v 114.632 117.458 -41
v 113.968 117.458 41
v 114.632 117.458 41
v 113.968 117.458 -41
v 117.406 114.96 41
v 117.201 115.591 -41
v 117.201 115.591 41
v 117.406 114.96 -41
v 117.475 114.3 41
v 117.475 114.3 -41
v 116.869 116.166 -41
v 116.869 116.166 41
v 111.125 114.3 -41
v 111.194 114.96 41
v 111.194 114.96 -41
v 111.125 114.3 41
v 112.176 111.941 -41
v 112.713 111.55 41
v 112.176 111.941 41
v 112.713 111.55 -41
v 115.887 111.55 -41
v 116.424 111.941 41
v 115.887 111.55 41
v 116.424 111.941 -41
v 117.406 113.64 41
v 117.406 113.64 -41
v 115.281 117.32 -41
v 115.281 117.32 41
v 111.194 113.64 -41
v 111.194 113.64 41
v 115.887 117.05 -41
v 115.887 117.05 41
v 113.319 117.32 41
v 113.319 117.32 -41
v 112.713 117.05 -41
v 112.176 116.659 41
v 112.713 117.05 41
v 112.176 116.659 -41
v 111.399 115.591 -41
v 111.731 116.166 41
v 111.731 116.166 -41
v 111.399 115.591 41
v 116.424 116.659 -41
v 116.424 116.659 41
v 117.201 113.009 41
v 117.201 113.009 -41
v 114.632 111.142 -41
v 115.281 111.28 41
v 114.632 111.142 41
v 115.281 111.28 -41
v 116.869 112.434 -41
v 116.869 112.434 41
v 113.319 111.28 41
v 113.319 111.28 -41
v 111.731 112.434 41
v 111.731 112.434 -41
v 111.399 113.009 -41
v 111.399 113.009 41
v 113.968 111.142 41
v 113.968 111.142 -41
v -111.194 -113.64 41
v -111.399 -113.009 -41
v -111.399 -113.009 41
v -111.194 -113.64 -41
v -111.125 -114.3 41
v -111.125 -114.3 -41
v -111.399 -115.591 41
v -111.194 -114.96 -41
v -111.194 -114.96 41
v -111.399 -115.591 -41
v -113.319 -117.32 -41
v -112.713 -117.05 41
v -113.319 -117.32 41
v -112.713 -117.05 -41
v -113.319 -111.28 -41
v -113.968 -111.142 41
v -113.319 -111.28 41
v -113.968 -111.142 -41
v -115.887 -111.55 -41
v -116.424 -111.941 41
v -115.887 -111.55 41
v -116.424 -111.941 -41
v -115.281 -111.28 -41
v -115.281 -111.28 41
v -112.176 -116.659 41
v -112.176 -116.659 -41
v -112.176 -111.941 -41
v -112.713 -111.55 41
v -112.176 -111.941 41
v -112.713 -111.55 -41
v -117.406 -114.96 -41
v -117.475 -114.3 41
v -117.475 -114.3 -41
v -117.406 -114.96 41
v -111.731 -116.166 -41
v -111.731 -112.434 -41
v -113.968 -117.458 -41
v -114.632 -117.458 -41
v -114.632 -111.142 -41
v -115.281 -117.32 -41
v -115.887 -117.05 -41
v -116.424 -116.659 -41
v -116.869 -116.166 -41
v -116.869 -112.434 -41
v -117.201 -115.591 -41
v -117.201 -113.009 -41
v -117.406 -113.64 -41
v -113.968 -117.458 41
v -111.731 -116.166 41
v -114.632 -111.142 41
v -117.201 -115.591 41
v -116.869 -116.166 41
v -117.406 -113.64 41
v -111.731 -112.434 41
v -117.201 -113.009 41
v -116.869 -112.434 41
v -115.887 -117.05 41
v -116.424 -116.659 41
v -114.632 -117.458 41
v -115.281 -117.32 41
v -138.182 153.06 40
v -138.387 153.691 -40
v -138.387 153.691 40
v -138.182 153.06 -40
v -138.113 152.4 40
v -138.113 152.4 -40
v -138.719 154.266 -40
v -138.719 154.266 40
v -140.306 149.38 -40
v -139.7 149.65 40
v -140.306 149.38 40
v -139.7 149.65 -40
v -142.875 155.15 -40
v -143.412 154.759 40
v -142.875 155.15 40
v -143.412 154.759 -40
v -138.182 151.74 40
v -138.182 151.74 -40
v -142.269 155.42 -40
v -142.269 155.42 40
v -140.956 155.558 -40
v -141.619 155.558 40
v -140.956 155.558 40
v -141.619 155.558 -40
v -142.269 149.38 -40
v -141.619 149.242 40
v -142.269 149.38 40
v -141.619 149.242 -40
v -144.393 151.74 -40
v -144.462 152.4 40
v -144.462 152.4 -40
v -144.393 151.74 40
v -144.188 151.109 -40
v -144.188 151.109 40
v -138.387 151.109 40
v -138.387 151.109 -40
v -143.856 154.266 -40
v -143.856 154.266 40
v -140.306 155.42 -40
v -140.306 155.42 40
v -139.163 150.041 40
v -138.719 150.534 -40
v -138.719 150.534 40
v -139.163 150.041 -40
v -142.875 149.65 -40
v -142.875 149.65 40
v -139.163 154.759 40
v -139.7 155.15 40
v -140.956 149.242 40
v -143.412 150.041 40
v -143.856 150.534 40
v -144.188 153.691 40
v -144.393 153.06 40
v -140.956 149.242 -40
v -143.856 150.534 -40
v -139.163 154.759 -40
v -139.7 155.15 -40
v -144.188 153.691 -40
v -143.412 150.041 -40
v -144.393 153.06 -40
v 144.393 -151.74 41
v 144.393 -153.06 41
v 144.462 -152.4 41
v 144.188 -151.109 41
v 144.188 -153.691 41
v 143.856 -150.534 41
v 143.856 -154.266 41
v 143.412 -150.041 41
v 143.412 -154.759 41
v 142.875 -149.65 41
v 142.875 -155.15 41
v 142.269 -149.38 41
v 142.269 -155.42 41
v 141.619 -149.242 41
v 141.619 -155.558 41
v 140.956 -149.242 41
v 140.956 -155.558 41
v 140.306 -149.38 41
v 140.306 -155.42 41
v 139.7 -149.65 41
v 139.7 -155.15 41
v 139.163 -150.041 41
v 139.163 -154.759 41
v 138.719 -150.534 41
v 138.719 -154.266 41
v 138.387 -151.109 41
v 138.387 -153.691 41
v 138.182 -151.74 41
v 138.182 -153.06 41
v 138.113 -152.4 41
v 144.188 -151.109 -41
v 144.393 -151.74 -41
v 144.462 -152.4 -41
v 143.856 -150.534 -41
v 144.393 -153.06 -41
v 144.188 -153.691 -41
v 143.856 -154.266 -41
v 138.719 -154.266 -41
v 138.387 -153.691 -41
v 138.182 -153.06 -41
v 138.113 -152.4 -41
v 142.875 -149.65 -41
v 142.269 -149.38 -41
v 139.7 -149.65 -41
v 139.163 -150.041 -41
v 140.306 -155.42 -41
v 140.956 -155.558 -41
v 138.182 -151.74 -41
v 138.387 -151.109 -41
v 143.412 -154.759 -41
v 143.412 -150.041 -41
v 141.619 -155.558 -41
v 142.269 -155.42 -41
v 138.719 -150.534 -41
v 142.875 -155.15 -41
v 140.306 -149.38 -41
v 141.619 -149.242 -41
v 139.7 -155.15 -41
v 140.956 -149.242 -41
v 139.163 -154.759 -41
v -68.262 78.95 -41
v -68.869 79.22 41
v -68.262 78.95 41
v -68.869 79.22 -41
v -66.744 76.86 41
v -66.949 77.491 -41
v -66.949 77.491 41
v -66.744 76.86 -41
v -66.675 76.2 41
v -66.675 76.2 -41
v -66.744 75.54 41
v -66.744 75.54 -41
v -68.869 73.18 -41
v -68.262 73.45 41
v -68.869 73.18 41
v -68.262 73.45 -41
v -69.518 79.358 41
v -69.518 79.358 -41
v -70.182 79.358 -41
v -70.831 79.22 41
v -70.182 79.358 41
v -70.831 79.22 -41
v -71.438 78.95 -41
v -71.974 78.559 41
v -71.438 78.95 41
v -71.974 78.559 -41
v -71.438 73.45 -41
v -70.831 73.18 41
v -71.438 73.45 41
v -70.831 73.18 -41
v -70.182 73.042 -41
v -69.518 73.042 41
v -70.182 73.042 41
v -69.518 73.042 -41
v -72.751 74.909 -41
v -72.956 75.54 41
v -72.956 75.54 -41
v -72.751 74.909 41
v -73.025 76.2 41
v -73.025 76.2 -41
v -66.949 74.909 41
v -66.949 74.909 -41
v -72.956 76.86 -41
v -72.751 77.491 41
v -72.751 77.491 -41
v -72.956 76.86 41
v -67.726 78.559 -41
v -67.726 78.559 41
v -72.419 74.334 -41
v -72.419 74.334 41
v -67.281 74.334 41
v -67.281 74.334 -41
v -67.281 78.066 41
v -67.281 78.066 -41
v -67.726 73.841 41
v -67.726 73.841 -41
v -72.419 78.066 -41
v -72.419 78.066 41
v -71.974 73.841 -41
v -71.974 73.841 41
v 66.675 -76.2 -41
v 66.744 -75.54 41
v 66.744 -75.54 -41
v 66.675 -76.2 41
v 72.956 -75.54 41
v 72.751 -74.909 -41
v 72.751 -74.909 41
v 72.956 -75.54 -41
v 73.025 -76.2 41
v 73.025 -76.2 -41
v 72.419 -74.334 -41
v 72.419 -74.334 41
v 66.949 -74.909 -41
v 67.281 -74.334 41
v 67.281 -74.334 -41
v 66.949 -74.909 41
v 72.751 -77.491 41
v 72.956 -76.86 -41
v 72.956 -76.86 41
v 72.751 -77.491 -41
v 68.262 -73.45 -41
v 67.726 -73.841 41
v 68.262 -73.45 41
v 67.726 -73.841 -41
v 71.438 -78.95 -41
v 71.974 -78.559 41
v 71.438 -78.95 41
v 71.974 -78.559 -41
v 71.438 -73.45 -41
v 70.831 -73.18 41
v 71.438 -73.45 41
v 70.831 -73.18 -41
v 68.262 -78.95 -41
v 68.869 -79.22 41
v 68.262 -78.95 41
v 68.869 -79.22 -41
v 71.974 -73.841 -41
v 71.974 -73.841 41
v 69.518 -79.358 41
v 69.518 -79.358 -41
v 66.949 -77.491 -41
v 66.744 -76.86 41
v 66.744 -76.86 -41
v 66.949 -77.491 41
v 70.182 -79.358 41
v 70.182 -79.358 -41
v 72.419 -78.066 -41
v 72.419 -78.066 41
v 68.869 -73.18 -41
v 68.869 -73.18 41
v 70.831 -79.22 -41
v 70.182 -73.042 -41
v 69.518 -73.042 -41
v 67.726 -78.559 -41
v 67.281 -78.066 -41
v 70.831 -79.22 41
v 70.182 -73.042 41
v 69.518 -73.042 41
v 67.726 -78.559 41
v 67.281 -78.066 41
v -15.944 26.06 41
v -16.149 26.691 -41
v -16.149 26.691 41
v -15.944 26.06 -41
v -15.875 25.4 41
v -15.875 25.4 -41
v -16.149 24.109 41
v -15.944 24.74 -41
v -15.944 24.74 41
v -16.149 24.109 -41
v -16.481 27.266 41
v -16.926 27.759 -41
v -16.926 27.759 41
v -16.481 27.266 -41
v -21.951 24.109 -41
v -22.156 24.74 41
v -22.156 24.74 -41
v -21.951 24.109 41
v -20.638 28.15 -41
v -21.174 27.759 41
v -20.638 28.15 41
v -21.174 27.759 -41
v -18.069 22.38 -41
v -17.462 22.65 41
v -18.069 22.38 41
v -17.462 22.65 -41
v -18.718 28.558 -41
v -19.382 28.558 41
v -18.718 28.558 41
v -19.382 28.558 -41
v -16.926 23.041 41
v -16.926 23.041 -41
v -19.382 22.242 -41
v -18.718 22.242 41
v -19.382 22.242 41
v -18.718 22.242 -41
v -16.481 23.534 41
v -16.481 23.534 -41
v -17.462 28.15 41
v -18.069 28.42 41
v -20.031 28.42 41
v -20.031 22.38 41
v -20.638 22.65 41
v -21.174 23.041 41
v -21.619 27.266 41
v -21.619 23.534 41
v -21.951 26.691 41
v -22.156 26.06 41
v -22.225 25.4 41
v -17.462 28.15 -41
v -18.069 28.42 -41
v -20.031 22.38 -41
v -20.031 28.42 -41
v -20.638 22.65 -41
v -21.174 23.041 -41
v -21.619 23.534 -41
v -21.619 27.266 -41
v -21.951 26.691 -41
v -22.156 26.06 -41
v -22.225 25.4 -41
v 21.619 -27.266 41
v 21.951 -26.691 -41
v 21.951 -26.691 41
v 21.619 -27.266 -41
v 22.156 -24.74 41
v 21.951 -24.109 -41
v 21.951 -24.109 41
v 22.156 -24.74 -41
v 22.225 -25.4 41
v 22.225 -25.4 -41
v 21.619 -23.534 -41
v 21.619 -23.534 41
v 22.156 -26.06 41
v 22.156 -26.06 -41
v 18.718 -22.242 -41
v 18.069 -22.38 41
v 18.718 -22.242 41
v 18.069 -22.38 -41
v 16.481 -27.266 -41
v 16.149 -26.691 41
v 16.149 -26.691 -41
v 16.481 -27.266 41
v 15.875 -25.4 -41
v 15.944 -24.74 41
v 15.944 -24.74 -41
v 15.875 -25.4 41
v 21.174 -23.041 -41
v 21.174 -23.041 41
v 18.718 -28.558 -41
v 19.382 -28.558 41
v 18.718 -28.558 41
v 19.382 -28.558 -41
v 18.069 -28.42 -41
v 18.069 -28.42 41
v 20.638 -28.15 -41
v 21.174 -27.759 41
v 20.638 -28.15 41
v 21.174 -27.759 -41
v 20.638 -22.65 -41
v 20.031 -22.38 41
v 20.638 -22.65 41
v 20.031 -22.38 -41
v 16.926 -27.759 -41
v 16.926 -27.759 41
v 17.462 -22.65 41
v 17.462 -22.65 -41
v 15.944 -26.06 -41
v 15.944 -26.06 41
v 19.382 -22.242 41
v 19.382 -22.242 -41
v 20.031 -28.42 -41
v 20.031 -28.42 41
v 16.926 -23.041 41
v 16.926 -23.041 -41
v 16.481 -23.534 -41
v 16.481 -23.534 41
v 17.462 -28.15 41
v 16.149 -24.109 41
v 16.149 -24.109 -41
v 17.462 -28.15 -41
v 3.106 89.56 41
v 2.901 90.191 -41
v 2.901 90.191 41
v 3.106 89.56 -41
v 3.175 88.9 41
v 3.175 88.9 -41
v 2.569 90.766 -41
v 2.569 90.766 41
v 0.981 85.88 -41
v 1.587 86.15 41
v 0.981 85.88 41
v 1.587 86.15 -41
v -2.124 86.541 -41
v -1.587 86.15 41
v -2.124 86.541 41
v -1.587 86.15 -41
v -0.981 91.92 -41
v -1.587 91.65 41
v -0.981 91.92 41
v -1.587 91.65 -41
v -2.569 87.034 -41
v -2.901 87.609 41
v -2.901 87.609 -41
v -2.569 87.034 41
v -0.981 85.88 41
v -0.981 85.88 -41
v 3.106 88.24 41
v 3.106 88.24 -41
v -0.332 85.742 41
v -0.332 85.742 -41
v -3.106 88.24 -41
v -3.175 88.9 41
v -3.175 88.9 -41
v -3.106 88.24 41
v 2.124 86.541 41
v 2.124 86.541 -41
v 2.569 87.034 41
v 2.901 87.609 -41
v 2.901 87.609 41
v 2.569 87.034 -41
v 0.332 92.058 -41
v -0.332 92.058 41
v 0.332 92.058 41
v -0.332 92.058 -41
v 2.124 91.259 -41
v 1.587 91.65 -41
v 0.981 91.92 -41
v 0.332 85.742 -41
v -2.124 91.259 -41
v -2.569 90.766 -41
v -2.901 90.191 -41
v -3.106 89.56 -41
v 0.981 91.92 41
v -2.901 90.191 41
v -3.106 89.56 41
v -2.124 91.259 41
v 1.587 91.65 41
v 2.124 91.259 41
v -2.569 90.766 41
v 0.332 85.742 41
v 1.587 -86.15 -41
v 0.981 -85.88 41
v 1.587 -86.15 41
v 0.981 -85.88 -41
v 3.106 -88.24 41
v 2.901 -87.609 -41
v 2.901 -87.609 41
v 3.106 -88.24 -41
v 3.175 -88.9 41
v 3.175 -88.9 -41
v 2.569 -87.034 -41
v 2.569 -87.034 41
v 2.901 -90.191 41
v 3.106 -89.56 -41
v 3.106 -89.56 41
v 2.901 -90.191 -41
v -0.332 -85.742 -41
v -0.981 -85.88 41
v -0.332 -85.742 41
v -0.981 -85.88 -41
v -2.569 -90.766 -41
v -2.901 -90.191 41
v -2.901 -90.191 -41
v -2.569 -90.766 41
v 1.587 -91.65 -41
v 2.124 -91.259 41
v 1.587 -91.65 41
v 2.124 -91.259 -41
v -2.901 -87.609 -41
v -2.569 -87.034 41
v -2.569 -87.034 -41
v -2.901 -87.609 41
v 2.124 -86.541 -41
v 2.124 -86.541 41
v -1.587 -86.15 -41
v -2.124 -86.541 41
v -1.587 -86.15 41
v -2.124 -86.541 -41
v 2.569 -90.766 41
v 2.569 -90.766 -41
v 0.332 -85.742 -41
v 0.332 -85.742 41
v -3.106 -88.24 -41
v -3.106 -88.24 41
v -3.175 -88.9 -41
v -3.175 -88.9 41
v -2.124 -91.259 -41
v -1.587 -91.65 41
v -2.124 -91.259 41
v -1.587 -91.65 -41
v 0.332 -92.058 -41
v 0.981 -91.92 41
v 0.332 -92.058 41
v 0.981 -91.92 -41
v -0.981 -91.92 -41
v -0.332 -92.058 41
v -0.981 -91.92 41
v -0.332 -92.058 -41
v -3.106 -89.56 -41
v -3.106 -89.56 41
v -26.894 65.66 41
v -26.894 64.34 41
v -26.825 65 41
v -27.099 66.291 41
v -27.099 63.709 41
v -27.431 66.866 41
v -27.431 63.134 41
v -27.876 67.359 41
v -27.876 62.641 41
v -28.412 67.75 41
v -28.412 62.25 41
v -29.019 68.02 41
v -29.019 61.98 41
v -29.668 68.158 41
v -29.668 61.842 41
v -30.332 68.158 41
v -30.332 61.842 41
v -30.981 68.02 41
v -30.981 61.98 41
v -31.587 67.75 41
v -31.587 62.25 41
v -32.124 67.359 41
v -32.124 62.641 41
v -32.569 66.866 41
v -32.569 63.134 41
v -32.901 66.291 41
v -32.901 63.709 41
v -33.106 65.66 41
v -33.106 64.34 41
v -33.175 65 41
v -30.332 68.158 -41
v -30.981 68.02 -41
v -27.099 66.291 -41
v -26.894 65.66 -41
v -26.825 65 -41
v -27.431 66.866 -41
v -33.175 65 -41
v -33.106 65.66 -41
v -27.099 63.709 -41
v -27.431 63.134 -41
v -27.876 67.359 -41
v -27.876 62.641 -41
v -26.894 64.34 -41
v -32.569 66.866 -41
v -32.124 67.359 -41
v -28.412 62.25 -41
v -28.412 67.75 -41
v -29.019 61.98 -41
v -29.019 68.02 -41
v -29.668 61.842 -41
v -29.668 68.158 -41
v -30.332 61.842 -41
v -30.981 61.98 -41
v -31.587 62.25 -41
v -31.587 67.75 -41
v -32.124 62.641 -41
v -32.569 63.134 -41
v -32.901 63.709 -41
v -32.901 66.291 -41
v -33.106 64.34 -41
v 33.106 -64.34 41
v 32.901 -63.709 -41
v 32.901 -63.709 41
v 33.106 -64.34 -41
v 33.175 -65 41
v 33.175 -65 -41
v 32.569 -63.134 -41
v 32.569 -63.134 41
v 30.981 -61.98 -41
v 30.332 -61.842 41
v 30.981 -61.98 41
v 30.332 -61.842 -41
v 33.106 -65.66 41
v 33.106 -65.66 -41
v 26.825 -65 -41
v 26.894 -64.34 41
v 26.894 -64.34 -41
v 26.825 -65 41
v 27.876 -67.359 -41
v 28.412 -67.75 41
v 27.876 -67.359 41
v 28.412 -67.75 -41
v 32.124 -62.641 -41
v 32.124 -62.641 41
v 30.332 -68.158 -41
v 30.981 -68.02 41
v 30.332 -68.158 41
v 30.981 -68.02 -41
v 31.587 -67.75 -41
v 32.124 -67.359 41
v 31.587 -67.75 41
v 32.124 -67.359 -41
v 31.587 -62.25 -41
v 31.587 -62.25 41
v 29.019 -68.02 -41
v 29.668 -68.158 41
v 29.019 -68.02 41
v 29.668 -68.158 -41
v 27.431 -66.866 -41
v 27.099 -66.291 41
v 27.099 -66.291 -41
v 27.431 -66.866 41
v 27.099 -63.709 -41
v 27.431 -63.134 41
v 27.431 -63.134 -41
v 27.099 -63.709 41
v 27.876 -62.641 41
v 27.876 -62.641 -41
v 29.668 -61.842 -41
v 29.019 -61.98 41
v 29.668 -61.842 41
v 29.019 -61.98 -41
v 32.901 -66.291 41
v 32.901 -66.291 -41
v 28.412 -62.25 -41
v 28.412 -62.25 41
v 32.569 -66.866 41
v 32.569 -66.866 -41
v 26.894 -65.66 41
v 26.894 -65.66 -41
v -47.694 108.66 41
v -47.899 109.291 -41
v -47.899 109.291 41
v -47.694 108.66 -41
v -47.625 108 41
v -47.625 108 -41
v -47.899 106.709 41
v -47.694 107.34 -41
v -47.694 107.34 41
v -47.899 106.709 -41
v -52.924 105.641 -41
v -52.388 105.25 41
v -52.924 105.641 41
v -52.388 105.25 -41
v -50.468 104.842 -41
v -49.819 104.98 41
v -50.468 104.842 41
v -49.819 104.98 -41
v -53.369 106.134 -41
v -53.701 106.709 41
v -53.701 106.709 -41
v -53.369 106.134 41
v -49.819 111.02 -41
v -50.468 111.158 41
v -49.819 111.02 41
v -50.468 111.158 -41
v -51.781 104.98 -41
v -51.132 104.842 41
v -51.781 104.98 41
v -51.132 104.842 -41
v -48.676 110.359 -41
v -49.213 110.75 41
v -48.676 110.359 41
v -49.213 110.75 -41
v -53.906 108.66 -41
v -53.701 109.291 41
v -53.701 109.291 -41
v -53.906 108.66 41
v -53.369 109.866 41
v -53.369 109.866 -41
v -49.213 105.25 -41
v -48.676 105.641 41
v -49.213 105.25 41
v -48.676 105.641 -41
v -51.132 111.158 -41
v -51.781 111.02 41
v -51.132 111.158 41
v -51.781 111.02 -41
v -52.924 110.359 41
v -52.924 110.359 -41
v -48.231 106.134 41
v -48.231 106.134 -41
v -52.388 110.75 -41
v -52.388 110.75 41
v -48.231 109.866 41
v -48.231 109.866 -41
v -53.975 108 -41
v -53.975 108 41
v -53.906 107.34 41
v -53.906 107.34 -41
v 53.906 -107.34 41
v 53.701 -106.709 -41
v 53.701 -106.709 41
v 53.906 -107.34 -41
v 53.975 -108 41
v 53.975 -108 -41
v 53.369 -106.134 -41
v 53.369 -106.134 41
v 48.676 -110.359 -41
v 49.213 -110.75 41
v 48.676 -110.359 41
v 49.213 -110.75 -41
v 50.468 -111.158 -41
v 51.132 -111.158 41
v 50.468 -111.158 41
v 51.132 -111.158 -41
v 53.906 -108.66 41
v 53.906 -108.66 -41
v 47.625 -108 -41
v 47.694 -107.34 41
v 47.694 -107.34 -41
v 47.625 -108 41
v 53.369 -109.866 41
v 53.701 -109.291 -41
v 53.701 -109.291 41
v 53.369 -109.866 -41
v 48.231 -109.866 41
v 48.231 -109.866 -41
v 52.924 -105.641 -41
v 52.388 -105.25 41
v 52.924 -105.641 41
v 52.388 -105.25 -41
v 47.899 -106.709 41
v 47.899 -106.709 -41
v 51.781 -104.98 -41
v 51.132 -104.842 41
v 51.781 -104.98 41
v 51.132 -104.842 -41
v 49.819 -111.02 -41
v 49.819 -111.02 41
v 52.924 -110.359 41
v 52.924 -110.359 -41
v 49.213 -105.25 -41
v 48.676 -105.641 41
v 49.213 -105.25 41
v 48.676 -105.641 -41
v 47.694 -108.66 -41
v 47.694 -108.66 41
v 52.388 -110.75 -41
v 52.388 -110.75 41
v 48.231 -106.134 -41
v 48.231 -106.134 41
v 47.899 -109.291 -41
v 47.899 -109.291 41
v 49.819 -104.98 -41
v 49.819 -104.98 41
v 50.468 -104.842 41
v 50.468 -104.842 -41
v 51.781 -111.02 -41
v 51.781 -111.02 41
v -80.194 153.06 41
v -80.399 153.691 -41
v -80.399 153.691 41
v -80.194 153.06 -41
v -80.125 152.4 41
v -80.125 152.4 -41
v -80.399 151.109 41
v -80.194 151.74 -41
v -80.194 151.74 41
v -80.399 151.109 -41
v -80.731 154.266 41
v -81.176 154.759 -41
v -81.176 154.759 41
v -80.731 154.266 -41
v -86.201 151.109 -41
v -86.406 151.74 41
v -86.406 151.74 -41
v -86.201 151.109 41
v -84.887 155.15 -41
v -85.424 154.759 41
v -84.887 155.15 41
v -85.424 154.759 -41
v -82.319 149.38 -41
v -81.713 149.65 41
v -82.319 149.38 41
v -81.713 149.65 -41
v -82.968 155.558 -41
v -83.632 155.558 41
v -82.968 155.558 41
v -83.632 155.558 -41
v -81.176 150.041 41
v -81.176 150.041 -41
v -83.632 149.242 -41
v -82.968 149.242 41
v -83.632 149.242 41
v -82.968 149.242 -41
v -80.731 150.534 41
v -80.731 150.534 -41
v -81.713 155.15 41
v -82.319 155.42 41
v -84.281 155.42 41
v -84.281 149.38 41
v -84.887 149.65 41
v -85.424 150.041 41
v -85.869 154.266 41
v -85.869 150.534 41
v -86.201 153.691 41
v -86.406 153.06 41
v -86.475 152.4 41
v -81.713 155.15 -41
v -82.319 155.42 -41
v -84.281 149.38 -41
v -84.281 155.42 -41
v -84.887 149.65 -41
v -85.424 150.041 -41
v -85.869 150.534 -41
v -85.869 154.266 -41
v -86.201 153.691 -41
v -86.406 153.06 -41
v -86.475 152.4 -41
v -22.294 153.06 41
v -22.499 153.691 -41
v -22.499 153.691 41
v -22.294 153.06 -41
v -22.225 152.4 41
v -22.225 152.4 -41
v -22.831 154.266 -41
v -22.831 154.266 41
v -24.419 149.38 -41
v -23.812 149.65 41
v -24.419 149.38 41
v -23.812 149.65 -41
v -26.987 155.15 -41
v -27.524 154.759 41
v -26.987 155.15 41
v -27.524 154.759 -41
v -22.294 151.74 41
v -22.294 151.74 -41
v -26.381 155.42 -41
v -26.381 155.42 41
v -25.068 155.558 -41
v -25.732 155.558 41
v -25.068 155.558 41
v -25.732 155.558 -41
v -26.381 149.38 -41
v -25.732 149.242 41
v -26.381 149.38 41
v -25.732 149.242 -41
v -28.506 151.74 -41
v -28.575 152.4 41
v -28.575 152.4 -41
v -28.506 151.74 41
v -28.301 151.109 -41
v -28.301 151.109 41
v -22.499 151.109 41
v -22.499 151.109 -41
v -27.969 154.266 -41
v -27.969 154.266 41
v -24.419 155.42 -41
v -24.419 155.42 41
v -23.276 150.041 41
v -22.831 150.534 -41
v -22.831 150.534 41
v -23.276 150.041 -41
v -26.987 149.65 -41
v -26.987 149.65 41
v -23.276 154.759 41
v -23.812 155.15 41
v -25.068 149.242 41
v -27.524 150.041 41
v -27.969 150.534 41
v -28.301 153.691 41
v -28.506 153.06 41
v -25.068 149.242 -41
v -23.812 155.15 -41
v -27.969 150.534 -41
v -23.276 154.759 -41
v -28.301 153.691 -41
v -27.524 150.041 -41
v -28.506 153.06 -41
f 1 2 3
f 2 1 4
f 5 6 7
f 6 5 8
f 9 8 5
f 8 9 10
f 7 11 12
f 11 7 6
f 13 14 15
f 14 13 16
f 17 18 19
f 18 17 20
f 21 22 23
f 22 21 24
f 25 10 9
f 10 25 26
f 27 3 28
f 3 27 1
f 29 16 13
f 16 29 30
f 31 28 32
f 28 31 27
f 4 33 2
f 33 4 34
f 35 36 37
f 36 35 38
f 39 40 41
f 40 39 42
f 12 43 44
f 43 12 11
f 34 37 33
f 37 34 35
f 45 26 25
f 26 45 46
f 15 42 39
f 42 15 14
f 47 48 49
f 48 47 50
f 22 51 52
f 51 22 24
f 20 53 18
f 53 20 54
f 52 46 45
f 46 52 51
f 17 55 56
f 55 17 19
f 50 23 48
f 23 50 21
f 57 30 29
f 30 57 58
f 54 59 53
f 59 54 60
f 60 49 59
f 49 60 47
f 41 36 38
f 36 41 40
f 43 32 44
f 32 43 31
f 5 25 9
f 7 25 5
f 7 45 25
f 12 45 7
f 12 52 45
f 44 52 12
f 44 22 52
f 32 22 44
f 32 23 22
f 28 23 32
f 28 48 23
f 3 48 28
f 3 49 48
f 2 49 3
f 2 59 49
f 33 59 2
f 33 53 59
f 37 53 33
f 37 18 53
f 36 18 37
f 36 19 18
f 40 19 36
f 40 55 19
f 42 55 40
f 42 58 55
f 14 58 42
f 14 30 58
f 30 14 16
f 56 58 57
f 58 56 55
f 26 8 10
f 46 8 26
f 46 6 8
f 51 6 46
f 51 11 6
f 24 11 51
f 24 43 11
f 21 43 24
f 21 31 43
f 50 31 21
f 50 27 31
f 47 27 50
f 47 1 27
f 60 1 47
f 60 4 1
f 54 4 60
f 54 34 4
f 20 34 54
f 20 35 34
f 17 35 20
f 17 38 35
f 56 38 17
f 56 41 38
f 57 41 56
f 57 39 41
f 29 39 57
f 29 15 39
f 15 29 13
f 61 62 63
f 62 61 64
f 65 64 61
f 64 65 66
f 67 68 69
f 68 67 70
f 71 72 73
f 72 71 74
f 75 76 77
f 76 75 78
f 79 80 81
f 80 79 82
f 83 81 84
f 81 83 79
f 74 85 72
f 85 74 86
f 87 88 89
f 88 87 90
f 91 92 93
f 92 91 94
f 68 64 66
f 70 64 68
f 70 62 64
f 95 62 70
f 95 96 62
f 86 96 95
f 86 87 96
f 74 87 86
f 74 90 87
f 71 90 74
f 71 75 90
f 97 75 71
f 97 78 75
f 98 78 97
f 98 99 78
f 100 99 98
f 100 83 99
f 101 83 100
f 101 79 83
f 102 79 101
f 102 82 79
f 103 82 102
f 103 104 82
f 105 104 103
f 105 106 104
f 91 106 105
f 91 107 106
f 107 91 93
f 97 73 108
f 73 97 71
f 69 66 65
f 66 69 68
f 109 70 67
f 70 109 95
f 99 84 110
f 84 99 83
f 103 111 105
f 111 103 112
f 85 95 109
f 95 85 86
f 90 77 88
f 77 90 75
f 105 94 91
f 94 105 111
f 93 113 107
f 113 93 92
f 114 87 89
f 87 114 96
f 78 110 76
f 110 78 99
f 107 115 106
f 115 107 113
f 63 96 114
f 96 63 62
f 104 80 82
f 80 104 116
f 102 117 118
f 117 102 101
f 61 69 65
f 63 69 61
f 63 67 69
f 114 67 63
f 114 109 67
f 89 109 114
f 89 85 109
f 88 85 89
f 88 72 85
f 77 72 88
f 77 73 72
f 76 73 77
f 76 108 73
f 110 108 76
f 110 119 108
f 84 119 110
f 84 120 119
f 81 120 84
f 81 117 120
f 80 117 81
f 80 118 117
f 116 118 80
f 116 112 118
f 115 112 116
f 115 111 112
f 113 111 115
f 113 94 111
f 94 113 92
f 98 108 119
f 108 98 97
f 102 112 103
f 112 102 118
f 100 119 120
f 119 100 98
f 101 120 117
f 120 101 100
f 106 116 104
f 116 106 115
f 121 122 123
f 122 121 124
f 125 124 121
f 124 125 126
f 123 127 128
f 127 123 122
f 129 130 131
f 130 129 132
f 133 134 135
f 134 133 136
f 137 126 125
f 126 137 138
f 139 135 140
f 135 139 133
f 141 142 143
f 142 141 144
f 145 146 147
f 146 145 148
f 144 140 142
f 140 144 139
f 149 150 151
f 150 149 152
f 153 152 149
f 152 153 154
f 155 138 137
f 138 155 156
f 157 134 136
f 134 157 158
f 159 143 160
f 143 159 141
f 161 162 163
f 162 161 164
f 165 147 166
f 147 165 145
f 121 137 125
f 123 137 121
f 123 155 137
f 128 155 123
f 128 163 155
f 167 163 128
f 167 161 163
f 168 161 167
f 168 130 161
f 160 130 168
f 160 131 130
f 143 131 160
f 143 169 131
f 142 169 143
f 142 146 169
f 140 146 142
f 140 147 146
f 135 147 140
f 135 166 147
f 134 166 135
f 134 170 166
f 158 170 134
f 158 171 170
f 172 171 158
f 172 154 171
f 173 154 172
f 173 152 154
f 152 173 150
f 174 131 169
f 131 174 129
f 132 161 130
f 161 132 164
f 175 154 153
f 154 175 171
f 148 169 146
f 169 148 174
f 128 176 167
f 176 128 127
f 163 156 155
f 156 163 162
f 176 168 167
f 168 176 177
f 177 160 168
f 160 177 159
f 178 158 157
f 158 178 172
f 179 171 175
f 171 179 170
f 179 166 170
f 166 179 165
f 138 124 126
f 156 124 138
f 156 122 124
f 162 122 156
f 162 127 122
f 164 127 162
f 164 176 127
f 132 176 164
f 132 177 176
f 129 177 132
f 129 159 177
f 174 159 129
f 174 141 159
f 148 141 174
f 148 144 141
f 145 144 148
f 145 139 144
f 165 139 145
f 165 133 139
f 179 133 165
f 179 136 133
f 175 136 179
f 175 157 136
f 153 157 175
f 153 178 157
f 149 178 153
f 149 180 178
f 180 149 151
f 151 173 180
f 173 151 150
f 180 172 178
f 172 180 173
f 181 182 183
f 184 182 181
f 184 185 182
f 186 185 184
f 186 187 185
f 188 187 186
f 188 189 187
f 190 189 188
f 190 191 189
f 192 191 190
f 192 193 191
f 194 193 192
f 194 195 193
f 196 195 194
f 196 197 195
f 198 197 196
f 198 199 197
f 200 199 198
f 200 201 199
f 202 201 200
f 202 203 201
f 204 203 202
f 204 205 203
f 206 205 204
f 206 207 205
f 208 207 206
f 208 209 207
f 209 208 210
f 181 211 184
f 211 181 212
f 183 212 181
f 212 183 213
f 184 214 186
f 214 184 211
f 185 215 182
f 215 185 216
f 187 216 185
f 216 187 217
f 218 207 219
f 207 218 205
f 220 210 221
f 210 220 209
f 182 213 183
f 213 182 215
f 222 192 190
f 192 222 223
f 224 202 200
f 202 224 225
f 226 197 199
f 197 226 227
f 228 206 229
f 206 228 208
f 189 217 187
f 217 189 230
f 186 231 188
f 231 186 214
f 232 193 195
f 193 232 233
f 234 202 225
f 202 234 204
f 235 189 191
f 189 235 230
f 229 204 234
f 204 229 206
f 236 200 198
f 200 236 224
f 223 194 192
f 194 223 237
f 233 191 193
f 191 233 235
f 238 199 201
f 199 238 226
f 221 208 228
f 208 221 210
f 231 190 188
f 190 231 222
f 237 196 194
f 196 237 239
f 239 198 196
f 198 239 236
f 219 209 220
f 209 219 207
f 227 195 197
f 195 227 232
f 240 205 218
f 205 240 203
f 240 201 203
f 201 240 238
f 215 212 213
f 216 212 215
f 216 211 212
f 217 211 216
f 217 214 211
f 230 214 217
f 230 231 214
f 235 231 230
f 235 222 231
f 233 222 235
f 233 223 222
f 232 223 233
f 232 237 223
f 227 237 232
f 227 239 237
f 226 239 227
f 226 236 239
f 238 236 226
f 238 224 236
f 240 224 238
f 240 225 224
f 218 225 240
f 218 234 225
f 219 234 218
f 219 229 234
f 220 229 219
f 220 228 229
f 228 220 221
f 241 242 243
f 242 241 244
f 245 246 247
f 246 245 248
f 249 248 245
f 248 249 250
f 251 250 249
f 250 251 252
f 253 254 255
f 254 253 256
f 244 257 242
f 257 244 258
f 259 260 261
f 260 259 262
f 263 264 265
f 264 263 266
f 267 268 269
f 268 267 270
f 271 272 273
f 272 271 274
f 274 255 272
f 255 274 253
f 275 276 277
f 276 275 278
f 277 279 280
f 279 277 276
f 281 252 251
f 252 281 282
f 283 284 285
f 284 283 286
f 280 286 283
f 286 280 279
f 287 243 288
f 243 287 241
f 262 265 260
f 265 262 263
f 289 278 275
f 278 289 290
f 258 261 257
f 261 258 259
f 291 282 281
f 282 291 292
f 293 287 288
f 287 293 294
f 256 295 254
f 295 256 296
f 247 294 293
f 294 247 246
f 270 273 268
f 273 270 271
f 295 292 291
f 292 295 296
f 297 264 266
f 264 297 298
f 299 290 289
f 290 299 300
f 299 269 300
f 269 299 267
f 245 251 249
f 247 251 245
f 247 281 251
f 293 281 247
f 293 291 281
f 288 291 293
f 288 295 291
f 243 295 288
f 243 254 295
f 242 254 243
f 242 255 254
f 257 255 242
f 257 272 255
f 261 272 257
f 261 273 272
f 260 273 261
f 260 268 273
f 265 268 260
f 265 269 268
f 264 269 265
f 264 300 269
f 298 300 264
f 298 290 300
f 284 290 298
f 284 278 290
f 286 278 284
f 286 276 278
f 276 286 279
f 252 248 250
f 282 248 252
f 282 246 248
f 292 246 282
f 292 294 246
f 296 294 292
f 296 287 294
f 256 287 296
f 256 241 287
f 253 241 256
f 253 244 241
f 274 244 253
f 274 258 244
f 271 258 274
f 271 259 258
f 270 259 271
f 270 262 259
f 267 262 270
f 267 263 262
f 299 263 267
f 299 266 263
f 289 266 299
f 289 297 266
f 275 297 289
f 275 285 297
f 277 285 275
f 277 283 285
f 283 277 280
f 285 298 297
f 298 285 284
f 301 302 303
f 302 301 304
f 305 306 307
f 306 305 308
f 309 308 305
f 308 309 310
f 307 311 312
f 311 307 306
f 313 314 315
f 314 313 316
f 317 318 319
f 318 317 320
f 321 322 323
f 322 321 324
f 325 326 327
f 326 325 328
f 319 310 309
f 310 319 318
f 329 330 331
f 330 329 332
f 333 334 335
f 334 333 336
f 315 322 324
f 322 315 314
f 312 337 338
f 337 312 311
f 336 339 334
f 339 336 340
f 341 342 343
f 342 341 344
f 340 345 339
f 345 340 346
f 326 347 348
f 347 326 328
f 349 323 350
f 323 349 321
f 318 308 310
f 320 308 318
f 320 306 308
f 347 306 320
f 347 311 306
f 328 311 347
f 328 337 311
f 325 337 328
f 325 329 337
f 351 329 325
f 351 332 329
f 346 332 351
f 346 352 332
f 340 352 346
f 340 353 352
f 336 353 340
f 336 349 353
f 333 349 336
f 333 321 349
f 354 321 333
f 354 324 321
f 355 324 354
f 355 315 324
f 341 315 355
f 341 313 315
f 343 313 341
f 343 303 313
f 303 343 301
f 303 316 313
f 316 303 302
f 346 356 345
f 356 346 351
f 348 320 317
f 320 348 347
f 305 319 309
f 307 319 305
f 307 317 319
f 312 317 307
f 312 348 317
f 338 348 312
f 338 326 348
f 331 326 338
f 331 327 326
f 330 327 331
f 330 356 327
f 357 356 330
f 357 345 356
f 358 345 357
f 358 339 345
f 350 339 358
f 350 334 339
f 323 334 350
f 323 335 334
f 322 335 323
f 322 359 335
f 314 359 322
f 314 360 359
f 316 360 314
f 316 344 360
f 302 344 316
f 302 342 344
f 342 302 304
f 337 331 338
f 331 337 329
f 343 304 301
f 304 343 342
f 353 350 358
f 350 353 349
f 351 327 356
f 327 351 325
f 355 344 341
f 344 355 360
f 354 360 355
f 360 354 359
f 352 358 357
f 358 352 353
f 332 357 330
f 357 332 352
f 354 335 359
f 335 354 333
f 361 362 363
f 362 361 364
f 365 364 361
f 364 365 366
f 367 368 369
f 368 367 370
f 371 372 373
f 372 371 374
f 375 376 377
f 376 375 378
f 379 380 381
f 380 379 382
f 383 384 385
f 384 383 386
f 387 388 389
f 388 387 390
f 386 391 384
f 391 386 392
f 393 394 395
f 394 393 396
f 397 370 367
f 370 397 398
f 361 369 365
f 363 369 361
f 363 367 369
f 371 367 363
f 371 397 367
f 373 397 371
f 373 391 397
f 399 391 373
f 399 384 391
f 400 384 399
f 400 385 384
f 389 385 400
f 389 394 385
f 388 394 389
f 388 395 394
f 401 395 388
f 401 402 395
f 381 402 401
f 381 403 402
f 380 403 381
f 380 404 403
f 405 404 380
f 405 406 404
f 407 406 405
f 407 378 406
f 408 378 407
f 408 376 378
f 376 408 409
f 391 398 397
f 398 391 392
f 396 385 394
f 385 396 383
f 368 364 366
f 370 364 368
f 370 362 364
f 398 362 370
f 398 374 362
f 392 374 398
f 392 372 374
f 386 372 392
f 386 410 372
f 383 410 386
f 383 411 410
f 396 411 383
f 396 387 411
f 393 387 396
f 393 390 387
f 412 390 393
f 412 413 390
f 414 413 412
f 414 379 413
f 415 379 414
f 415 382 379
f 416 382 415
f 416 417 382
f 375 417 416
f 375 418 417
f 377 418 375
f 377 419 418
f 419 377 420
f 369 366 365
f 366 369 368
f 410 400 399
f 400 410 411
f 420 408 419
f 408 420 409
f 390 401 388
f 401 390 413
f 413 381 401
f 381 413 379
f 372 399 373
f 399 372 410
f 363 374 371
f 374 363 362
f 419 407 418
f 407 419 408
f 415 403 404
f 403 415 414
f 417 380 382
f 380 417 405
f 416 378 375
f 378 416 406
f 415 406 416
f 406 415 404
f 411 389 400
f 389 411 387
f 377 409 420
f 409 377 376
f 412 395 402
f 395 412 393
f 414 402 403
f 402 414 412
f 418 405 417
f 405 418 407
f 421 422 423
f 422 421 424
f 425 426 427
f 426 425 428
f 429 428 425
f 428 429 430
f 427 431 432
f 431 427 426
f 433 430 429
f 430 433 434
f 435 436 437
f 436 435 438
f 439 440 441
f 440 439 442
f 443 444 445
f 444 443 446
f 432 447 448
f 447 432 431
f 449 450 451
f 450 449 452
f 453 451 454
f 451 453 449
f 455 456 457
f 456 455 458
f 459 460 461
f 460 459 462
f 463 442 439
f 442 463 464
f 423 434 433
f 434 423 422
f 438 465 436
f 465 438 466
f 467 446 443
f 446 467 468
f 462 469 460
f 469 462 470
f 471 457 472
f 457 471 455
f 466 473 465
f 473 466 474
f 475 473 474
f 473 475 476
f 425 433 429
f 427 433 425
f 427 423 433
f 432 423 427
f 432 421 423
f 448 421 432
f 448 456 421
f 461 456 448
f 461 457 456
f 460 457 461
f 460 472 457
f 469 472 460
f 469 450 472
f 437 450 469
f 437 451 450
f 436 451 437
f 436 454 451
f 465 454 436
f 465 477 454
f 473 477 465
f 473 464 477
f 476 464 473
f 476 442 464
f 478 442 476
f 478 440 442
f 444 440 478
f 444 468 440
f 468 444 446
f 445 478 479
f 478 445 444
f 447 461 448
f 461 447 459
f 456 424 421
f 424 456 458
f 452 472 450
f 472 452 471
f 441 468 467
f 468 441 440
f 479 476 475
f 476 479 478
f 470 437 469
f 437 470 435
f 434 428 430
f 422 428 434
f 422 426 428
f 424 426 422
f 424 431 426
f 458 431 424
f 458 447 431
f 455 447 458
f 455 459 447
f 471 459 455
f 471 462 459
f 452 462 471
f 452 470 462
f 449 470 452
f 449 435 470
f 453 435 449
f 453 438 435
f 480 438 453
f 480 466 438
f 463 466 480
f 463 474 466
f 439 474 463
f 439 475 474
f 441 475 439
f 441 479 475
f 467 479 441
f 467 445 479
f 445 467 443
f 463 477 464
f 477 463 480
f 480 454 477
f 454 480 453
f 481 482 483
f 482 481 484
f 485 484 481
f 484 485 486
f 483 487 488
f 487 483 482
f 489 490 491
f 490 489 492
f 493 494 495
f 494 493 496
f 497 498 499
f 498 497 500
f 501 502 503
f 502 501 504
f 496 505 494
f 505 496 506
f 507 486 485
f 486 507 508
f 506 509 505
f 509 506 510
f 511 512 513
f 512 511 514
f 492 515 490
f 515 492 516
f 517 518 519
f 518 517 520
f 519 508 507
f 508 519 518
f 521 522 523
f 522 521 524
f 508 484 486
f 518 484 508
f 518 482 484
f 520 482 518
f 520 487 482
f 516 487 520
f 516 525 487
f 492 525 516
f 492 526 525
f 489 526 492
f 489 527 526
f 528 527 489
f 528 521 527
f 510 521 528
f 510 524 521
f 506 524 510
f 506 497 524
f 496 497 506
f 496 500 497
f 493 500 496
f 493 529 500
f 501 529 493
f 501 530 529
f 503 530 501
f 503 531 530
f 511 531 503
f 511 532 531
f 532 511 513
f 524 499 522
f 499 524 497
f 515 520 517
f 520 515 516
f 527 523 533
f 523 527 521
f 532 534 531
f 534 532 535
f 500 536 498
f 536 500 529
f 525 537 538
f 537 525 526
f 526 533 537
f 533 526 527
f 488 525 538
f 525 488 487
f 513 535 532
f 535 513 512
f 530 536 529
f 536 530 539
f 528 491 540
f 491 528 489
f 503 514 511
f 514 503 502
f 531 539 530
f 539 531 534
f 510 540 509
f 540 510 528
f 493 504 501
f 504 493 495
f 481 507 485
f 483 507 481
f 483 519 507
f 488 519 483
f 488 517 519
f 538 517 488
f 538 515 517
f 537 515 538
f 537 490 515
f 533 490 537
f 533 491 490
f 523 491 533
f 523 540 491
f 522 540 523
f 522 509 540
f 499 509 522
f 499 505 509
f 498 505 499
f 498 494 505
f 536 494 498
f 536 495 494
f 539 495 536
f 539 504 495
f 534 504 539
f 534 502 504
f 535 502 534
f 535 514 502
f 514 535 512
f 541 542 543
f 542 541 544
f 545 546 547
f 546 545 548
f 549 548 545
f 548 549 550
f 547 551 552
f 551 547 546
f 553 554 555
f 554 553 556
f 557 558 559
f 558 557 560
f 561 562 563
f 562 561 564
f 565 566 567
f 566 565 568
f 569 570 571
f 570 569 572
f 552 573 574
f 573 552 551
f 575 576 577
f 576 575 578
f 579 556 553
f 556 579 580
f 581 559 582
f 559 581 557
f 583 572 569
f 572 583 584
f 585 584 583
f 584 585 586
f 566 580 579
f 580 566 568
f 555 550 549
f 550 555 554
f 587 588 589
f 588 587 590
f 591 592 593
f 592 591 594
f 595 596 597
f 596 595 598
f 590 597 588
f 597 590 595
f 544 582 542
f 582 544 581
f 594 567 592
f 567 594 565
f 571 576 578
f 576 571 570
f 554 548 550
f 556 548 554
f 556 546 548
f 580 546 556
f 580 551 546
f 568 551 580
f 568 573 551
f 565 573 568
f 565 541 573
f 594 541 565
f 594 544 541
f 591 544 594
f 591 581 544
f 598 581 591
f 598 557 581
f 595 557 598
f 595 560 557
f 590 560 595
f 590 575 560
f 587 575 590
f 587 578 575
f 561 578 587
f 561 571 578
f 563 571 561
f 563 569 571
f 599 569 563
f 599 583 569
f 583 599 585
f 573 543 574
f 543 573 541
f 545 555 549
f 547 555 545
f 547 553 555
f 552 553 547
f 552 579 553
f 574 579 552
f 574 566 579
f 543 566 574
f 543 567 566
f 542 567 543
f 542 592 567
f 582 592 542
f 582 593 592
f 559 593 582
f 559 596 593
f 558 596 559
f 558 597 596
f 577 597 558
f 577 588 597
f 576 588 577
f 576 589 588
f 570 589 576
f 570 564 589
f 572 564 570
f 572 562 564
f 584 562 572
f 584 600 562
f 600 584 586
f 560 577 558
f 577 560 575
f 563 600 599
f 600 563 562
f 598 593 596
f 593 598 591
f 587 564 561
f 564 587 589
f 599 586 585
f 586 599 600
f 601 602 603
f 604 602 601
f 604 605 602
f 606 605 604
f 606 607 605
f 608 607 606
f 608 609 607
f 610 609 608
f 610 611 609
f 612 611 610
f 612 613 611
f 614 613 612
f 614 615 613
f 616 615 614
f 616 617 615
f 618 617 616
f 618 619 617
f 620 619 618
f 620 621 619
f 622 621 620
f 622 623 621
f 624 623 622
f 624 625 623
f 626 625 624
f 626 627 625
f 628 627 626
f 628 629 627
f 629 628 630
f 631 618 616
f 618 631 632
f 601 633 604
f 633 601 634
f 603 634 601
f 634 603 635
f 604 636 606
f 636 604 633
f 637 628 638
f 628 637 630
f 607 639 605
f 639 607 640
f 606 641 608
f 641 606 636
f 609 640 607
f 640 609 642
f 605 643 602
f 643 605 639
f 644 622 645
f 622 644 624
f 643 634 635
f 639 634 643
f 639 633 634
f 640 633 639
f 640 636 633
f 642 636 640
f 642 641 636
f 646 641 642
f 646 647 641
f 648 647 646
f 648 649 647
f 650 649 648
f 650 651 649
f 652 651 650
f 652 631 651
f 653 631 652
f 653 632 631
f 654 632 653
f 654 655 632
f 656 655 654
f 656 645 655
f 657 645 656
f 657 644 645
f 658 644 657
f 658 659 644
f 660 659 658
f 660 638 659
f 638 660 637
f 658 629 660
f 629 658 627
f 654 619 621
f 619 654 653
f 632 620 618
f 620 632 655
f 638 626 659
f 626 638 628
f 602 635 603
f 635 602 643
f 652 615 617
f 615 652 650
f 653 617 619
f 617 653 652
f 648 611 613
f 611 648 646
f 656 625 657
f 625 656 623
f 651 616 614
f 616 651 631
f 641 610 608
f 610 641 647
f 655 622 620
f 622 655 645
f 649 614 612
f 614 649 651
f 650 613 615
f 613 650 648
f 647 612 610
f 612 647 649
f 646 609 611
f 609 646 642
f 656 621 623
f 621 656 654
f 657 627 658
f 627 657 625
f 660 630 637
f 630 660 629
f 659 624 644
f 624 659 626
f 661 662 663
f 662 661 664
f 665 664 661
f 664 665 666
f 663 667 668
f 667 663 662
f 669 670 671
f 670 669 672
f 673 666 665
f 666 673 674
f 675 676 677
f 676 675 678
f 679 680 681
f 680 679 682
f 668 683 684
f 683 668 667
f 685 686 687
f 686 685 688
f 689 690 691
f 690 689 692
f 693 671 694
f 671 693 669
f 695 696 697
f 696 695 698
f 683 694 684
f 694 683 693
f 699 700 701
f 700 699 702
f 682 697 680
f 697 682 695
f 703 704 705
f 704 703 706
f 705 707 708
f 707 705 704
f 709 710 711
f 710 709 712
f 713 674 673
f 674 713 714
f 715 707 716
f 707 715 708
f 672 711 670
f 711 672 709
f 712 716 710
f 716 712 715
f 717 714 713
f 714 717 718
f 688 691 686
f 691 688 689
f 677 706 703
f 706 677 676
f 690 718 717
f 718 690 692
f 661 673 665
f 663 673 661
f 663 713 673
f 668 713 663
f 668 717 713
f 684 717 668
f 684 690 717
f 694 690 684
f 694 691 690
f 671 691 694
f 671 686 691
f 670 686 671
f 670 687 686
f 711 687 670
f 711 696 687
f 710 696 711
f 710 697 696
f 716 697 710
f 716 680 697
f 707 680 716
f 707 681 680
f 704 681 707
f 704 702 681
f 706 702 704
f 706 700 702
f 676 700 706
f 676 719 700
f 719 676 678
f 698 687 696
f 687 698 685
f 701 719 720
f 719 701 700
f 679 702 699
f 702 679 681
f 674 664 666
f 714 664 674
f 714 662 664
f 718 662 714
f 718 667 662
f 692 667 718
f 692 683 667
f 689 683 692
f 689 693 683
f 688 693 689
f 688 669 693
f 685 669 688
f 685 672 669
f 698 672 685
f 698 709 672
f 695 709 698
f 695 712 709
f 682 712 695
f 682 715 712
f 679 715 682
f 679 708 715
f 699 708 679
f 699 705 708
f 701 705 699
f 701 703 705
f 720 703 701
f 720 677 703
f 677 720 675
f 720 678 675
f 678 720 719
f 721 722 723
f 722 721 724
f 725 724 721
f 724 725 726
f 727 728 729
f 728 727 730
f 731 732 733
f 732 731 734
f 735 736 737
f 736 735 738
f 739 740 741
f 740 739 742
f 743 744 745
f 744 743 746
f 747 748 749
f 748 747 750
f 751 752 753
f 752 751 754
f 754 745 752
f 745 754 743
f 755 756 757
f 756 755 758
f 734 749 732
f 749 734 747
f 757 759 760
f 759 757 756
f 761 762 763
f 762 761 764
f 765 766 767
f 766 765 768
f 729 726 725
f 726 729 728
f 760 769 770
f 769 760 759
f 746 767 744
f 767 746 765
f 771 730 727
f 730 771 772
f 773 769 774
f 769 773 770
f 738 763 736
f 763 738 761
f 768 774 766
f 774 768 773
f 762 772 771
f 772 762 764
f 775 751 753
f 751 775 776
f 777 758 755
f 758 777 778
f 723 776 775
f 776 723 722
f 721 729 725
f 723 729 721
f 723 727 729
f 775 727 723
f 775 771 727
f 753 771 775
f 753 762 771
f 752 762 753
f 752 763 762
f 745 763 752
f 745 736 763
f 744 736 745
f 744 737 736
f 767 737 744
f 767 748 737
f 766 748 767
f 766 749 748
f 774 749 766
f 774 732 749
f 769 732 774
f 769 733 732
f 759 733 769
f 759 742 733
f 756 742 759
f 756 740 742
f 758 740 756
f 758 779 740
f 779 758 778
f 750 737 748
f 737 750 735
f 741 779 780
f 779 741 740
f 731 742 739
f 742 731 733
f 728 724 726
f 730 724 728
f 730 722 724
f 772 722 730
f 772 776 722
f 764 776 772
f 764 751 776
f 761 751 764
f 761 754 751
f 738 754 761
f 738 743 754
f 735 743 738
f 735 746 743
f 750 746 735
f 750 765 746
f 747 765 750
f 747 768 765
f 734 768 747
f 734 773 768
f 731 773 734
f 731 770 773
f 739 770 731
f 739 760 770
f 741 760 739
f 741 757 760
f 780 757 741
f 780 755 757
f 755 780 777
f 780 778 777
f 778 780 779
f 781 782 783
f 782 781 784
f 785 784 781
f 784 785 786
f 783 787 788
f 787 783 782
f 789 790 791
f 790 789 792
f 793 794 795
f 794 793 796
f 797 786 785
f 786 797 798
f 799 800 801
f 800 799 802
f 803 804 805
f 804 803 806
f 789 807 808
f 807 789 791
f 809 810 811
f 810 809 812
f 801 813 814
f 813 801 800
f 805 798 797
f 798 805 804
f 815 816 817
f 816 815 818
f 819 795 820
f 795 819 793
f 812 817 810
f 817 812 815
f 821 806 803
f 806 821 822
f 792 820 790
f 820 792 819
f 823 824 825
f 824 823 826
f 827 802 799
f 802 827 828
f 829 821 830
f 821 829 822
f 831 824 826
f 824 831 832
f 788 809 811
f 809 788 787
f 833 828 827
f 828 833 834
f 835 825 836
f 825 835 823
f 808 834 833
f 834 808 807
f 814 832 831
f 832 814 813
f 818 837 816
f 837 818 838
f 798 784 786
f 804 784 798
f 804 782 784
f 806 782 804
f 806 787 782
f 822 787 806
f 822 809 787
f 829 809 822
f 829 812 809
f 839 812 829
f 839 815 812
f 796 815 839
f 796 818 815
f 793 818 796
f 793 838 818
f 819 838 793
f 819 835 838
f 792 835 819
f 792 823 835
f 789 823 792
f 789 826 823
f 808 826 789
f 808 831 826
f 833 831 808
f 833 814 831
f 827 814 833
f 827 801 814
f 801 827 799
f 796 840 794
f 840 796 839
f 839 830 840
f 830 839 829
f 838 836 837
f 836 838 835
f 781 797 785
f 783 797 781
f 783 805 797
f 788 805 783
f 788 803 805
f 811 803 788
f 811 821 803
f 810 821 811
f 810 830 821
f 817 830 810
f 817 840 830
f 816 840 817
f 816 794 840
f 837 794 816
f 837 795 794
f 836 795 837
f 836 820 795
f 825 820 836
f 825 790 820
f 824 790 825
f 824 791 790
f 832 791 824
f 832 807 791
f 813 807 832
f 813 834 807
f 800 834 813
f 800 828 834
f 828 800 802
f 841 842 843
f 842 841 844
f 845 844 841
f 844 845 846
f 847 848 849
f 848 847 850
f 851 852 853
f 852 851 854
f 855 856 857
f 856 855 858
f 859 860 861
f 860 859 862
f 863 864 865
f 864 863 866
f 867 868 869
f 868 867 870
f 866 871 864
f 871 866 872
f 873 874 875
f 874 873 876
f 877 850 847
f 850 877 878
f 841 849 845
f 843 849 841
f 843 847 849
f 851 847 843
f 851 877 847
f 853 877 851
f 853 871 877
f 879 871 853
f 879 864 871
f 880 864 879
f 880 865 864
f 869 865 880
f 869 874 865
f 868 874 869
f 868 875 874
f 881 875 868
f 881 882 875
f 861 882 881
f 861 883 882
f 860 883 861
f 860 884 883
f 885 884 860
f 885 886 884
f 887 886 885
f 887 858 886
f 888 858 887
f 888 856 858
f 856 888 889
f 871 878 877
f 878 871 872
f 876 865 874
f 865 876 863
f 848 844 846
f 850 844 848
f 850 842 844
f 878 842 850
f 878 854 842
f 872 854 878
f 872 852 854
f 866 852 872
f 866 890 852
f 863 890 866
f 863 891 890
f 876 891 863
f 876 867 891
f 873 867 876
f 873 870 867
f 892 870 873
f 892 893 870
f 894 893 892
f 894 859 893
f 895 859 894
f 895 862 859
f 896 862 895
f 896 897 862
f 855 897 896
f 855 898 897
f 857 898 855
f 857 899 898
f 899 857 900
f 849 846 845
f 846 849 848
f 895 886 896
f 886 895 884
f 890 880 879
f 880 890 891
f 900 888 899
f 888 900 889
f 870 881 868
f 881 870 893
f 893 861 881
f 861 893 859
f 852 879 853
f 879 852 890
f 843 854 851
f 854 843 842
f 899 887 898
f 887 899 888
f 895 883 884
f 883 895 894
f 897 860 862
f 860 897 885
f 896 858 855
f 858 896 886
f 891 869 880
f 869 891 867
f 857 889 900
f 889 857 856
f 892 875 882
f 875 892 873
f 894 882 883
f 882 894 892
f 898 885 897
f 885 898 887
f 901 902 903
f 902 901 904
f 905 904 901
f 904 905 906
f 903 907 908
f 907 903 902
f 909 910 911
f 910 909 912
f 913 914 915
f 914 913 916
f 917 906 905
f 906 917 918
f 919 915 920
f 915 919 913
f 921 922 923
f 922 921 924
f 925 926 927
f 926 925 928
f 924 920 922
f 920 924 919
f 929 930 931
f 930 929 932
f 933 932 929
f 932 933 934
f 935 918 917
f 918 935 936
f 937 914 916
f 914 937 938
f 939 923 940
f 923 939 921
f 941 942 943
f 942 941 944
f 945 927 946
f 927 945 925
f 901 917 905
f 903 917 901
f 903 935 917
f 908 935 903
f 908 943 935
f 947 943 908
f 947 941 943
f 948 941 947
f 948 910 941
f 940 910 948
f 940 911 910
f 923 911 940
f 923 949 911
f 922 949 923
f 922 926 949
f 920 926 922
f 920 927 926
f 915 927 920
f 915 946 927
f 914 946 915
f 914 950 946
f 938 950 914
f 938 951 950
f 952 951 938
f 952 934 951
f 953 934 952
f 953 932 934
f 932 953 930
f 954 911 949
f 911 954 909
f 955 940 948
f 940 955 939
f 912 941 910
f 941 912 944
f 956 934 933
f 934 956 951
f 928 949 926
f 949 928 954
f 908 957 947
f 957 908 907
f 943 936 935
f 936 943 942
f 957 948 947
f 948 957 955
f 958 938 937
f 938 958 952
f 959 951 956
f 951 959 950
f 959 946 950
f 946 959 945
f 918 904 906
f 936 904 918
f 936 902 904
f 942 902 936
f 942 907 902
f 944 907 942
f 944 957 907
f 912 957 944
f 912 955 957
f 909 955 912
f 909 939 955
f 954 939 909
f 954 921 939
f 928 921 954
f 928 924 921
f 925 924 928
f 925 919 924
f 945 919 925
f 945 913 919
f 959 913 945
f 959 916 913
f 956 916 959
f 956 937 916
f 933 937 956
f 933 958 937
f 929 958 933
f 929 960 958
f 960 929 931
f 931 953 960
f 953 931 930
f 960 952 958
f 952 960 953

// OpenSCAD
module guiderollerscrews()
{
	difference() 
	{
		union() 
		color("silver")
		{
			translate([114.3,114.3,0])
			cylinder(h=82, d=6.35, center = true, $fs=.01); //supply motor spindle cutout
             translate([-114.3,-114.3,0])
			cylinder(h=82, d=6.35, center = true, $fs=.01); //takeup motor supply cutout
             translate([-141.2875,152.4,0])
			cylinder(h=80, d=6.35, center = true, $fs=.01); //supply corner roller 
             translate([141.2875,-152.4,0])
			cylinder(h=82, d=6.35, center = true, $fs=.01); // takeup corner roller
             translate([-69.85, 76.2,0])
			cylinder(h=82, d=6.35, center = true, $fs=.01); //cleaning path guide roller A
             translate([69.85,-76.2,0])
			cylinder(h=82, d=6.35, center = true, $fs=.01); //cleaning path guide roller B
             translate([-19.05,25.4,0])
			cylinder(h=82, d=6.35, center = true, $fs=.01); //cleaning path guide roller C
             translate([19.05, -25.4,0])
			cylinder(h=82, d=6.35, center = true, $fs=.01); //cleaning path guide roller D
             translate([0,88.9,0])
			cylinder(h=82, d=6.35, center = true, $fs=.01); //cleaning path guide roller E
             translate([0, -88.9,0])
			cylinder(h=82, d=6.35, center = true, $fs=.01); //cleaning path guide roller F
             translate([-30,65,0])
			cylinder(h=82, d=6.35, center = true, $fs=.01); //cleaning path guide roller G //supply-side supply pellon
             translate([30,-65,0])
			cylinder(h=82, d=6.35, center = true, $fs=.01); //cleaning path guide roller H //takeup-side supply pellon
             translate([-50.8,108,0])
			cylinder(h=82, d=6.35, center = true, $fs=.01); //cleaning path guide roller I //supply-side takeup pellon
             translate([50.8,-108,0])
			cylinder(h=82, d=6.35, center = true, $fs=.01); //cleaning path guide roller J //takeup-side takeup pellon
            translate([-83.3, 152.4,0])
			cylinder(h=82, d=6.35, center = true, $fs=.01); //tension arm roller
             translate([-25.4, 152.4,0]) 
			cylinder(h=82, d=6.35, center = true, $fs=.01); //supplyside initial roller
		}
		union()

		{

		}
	}
}

guiderollerscrews();
